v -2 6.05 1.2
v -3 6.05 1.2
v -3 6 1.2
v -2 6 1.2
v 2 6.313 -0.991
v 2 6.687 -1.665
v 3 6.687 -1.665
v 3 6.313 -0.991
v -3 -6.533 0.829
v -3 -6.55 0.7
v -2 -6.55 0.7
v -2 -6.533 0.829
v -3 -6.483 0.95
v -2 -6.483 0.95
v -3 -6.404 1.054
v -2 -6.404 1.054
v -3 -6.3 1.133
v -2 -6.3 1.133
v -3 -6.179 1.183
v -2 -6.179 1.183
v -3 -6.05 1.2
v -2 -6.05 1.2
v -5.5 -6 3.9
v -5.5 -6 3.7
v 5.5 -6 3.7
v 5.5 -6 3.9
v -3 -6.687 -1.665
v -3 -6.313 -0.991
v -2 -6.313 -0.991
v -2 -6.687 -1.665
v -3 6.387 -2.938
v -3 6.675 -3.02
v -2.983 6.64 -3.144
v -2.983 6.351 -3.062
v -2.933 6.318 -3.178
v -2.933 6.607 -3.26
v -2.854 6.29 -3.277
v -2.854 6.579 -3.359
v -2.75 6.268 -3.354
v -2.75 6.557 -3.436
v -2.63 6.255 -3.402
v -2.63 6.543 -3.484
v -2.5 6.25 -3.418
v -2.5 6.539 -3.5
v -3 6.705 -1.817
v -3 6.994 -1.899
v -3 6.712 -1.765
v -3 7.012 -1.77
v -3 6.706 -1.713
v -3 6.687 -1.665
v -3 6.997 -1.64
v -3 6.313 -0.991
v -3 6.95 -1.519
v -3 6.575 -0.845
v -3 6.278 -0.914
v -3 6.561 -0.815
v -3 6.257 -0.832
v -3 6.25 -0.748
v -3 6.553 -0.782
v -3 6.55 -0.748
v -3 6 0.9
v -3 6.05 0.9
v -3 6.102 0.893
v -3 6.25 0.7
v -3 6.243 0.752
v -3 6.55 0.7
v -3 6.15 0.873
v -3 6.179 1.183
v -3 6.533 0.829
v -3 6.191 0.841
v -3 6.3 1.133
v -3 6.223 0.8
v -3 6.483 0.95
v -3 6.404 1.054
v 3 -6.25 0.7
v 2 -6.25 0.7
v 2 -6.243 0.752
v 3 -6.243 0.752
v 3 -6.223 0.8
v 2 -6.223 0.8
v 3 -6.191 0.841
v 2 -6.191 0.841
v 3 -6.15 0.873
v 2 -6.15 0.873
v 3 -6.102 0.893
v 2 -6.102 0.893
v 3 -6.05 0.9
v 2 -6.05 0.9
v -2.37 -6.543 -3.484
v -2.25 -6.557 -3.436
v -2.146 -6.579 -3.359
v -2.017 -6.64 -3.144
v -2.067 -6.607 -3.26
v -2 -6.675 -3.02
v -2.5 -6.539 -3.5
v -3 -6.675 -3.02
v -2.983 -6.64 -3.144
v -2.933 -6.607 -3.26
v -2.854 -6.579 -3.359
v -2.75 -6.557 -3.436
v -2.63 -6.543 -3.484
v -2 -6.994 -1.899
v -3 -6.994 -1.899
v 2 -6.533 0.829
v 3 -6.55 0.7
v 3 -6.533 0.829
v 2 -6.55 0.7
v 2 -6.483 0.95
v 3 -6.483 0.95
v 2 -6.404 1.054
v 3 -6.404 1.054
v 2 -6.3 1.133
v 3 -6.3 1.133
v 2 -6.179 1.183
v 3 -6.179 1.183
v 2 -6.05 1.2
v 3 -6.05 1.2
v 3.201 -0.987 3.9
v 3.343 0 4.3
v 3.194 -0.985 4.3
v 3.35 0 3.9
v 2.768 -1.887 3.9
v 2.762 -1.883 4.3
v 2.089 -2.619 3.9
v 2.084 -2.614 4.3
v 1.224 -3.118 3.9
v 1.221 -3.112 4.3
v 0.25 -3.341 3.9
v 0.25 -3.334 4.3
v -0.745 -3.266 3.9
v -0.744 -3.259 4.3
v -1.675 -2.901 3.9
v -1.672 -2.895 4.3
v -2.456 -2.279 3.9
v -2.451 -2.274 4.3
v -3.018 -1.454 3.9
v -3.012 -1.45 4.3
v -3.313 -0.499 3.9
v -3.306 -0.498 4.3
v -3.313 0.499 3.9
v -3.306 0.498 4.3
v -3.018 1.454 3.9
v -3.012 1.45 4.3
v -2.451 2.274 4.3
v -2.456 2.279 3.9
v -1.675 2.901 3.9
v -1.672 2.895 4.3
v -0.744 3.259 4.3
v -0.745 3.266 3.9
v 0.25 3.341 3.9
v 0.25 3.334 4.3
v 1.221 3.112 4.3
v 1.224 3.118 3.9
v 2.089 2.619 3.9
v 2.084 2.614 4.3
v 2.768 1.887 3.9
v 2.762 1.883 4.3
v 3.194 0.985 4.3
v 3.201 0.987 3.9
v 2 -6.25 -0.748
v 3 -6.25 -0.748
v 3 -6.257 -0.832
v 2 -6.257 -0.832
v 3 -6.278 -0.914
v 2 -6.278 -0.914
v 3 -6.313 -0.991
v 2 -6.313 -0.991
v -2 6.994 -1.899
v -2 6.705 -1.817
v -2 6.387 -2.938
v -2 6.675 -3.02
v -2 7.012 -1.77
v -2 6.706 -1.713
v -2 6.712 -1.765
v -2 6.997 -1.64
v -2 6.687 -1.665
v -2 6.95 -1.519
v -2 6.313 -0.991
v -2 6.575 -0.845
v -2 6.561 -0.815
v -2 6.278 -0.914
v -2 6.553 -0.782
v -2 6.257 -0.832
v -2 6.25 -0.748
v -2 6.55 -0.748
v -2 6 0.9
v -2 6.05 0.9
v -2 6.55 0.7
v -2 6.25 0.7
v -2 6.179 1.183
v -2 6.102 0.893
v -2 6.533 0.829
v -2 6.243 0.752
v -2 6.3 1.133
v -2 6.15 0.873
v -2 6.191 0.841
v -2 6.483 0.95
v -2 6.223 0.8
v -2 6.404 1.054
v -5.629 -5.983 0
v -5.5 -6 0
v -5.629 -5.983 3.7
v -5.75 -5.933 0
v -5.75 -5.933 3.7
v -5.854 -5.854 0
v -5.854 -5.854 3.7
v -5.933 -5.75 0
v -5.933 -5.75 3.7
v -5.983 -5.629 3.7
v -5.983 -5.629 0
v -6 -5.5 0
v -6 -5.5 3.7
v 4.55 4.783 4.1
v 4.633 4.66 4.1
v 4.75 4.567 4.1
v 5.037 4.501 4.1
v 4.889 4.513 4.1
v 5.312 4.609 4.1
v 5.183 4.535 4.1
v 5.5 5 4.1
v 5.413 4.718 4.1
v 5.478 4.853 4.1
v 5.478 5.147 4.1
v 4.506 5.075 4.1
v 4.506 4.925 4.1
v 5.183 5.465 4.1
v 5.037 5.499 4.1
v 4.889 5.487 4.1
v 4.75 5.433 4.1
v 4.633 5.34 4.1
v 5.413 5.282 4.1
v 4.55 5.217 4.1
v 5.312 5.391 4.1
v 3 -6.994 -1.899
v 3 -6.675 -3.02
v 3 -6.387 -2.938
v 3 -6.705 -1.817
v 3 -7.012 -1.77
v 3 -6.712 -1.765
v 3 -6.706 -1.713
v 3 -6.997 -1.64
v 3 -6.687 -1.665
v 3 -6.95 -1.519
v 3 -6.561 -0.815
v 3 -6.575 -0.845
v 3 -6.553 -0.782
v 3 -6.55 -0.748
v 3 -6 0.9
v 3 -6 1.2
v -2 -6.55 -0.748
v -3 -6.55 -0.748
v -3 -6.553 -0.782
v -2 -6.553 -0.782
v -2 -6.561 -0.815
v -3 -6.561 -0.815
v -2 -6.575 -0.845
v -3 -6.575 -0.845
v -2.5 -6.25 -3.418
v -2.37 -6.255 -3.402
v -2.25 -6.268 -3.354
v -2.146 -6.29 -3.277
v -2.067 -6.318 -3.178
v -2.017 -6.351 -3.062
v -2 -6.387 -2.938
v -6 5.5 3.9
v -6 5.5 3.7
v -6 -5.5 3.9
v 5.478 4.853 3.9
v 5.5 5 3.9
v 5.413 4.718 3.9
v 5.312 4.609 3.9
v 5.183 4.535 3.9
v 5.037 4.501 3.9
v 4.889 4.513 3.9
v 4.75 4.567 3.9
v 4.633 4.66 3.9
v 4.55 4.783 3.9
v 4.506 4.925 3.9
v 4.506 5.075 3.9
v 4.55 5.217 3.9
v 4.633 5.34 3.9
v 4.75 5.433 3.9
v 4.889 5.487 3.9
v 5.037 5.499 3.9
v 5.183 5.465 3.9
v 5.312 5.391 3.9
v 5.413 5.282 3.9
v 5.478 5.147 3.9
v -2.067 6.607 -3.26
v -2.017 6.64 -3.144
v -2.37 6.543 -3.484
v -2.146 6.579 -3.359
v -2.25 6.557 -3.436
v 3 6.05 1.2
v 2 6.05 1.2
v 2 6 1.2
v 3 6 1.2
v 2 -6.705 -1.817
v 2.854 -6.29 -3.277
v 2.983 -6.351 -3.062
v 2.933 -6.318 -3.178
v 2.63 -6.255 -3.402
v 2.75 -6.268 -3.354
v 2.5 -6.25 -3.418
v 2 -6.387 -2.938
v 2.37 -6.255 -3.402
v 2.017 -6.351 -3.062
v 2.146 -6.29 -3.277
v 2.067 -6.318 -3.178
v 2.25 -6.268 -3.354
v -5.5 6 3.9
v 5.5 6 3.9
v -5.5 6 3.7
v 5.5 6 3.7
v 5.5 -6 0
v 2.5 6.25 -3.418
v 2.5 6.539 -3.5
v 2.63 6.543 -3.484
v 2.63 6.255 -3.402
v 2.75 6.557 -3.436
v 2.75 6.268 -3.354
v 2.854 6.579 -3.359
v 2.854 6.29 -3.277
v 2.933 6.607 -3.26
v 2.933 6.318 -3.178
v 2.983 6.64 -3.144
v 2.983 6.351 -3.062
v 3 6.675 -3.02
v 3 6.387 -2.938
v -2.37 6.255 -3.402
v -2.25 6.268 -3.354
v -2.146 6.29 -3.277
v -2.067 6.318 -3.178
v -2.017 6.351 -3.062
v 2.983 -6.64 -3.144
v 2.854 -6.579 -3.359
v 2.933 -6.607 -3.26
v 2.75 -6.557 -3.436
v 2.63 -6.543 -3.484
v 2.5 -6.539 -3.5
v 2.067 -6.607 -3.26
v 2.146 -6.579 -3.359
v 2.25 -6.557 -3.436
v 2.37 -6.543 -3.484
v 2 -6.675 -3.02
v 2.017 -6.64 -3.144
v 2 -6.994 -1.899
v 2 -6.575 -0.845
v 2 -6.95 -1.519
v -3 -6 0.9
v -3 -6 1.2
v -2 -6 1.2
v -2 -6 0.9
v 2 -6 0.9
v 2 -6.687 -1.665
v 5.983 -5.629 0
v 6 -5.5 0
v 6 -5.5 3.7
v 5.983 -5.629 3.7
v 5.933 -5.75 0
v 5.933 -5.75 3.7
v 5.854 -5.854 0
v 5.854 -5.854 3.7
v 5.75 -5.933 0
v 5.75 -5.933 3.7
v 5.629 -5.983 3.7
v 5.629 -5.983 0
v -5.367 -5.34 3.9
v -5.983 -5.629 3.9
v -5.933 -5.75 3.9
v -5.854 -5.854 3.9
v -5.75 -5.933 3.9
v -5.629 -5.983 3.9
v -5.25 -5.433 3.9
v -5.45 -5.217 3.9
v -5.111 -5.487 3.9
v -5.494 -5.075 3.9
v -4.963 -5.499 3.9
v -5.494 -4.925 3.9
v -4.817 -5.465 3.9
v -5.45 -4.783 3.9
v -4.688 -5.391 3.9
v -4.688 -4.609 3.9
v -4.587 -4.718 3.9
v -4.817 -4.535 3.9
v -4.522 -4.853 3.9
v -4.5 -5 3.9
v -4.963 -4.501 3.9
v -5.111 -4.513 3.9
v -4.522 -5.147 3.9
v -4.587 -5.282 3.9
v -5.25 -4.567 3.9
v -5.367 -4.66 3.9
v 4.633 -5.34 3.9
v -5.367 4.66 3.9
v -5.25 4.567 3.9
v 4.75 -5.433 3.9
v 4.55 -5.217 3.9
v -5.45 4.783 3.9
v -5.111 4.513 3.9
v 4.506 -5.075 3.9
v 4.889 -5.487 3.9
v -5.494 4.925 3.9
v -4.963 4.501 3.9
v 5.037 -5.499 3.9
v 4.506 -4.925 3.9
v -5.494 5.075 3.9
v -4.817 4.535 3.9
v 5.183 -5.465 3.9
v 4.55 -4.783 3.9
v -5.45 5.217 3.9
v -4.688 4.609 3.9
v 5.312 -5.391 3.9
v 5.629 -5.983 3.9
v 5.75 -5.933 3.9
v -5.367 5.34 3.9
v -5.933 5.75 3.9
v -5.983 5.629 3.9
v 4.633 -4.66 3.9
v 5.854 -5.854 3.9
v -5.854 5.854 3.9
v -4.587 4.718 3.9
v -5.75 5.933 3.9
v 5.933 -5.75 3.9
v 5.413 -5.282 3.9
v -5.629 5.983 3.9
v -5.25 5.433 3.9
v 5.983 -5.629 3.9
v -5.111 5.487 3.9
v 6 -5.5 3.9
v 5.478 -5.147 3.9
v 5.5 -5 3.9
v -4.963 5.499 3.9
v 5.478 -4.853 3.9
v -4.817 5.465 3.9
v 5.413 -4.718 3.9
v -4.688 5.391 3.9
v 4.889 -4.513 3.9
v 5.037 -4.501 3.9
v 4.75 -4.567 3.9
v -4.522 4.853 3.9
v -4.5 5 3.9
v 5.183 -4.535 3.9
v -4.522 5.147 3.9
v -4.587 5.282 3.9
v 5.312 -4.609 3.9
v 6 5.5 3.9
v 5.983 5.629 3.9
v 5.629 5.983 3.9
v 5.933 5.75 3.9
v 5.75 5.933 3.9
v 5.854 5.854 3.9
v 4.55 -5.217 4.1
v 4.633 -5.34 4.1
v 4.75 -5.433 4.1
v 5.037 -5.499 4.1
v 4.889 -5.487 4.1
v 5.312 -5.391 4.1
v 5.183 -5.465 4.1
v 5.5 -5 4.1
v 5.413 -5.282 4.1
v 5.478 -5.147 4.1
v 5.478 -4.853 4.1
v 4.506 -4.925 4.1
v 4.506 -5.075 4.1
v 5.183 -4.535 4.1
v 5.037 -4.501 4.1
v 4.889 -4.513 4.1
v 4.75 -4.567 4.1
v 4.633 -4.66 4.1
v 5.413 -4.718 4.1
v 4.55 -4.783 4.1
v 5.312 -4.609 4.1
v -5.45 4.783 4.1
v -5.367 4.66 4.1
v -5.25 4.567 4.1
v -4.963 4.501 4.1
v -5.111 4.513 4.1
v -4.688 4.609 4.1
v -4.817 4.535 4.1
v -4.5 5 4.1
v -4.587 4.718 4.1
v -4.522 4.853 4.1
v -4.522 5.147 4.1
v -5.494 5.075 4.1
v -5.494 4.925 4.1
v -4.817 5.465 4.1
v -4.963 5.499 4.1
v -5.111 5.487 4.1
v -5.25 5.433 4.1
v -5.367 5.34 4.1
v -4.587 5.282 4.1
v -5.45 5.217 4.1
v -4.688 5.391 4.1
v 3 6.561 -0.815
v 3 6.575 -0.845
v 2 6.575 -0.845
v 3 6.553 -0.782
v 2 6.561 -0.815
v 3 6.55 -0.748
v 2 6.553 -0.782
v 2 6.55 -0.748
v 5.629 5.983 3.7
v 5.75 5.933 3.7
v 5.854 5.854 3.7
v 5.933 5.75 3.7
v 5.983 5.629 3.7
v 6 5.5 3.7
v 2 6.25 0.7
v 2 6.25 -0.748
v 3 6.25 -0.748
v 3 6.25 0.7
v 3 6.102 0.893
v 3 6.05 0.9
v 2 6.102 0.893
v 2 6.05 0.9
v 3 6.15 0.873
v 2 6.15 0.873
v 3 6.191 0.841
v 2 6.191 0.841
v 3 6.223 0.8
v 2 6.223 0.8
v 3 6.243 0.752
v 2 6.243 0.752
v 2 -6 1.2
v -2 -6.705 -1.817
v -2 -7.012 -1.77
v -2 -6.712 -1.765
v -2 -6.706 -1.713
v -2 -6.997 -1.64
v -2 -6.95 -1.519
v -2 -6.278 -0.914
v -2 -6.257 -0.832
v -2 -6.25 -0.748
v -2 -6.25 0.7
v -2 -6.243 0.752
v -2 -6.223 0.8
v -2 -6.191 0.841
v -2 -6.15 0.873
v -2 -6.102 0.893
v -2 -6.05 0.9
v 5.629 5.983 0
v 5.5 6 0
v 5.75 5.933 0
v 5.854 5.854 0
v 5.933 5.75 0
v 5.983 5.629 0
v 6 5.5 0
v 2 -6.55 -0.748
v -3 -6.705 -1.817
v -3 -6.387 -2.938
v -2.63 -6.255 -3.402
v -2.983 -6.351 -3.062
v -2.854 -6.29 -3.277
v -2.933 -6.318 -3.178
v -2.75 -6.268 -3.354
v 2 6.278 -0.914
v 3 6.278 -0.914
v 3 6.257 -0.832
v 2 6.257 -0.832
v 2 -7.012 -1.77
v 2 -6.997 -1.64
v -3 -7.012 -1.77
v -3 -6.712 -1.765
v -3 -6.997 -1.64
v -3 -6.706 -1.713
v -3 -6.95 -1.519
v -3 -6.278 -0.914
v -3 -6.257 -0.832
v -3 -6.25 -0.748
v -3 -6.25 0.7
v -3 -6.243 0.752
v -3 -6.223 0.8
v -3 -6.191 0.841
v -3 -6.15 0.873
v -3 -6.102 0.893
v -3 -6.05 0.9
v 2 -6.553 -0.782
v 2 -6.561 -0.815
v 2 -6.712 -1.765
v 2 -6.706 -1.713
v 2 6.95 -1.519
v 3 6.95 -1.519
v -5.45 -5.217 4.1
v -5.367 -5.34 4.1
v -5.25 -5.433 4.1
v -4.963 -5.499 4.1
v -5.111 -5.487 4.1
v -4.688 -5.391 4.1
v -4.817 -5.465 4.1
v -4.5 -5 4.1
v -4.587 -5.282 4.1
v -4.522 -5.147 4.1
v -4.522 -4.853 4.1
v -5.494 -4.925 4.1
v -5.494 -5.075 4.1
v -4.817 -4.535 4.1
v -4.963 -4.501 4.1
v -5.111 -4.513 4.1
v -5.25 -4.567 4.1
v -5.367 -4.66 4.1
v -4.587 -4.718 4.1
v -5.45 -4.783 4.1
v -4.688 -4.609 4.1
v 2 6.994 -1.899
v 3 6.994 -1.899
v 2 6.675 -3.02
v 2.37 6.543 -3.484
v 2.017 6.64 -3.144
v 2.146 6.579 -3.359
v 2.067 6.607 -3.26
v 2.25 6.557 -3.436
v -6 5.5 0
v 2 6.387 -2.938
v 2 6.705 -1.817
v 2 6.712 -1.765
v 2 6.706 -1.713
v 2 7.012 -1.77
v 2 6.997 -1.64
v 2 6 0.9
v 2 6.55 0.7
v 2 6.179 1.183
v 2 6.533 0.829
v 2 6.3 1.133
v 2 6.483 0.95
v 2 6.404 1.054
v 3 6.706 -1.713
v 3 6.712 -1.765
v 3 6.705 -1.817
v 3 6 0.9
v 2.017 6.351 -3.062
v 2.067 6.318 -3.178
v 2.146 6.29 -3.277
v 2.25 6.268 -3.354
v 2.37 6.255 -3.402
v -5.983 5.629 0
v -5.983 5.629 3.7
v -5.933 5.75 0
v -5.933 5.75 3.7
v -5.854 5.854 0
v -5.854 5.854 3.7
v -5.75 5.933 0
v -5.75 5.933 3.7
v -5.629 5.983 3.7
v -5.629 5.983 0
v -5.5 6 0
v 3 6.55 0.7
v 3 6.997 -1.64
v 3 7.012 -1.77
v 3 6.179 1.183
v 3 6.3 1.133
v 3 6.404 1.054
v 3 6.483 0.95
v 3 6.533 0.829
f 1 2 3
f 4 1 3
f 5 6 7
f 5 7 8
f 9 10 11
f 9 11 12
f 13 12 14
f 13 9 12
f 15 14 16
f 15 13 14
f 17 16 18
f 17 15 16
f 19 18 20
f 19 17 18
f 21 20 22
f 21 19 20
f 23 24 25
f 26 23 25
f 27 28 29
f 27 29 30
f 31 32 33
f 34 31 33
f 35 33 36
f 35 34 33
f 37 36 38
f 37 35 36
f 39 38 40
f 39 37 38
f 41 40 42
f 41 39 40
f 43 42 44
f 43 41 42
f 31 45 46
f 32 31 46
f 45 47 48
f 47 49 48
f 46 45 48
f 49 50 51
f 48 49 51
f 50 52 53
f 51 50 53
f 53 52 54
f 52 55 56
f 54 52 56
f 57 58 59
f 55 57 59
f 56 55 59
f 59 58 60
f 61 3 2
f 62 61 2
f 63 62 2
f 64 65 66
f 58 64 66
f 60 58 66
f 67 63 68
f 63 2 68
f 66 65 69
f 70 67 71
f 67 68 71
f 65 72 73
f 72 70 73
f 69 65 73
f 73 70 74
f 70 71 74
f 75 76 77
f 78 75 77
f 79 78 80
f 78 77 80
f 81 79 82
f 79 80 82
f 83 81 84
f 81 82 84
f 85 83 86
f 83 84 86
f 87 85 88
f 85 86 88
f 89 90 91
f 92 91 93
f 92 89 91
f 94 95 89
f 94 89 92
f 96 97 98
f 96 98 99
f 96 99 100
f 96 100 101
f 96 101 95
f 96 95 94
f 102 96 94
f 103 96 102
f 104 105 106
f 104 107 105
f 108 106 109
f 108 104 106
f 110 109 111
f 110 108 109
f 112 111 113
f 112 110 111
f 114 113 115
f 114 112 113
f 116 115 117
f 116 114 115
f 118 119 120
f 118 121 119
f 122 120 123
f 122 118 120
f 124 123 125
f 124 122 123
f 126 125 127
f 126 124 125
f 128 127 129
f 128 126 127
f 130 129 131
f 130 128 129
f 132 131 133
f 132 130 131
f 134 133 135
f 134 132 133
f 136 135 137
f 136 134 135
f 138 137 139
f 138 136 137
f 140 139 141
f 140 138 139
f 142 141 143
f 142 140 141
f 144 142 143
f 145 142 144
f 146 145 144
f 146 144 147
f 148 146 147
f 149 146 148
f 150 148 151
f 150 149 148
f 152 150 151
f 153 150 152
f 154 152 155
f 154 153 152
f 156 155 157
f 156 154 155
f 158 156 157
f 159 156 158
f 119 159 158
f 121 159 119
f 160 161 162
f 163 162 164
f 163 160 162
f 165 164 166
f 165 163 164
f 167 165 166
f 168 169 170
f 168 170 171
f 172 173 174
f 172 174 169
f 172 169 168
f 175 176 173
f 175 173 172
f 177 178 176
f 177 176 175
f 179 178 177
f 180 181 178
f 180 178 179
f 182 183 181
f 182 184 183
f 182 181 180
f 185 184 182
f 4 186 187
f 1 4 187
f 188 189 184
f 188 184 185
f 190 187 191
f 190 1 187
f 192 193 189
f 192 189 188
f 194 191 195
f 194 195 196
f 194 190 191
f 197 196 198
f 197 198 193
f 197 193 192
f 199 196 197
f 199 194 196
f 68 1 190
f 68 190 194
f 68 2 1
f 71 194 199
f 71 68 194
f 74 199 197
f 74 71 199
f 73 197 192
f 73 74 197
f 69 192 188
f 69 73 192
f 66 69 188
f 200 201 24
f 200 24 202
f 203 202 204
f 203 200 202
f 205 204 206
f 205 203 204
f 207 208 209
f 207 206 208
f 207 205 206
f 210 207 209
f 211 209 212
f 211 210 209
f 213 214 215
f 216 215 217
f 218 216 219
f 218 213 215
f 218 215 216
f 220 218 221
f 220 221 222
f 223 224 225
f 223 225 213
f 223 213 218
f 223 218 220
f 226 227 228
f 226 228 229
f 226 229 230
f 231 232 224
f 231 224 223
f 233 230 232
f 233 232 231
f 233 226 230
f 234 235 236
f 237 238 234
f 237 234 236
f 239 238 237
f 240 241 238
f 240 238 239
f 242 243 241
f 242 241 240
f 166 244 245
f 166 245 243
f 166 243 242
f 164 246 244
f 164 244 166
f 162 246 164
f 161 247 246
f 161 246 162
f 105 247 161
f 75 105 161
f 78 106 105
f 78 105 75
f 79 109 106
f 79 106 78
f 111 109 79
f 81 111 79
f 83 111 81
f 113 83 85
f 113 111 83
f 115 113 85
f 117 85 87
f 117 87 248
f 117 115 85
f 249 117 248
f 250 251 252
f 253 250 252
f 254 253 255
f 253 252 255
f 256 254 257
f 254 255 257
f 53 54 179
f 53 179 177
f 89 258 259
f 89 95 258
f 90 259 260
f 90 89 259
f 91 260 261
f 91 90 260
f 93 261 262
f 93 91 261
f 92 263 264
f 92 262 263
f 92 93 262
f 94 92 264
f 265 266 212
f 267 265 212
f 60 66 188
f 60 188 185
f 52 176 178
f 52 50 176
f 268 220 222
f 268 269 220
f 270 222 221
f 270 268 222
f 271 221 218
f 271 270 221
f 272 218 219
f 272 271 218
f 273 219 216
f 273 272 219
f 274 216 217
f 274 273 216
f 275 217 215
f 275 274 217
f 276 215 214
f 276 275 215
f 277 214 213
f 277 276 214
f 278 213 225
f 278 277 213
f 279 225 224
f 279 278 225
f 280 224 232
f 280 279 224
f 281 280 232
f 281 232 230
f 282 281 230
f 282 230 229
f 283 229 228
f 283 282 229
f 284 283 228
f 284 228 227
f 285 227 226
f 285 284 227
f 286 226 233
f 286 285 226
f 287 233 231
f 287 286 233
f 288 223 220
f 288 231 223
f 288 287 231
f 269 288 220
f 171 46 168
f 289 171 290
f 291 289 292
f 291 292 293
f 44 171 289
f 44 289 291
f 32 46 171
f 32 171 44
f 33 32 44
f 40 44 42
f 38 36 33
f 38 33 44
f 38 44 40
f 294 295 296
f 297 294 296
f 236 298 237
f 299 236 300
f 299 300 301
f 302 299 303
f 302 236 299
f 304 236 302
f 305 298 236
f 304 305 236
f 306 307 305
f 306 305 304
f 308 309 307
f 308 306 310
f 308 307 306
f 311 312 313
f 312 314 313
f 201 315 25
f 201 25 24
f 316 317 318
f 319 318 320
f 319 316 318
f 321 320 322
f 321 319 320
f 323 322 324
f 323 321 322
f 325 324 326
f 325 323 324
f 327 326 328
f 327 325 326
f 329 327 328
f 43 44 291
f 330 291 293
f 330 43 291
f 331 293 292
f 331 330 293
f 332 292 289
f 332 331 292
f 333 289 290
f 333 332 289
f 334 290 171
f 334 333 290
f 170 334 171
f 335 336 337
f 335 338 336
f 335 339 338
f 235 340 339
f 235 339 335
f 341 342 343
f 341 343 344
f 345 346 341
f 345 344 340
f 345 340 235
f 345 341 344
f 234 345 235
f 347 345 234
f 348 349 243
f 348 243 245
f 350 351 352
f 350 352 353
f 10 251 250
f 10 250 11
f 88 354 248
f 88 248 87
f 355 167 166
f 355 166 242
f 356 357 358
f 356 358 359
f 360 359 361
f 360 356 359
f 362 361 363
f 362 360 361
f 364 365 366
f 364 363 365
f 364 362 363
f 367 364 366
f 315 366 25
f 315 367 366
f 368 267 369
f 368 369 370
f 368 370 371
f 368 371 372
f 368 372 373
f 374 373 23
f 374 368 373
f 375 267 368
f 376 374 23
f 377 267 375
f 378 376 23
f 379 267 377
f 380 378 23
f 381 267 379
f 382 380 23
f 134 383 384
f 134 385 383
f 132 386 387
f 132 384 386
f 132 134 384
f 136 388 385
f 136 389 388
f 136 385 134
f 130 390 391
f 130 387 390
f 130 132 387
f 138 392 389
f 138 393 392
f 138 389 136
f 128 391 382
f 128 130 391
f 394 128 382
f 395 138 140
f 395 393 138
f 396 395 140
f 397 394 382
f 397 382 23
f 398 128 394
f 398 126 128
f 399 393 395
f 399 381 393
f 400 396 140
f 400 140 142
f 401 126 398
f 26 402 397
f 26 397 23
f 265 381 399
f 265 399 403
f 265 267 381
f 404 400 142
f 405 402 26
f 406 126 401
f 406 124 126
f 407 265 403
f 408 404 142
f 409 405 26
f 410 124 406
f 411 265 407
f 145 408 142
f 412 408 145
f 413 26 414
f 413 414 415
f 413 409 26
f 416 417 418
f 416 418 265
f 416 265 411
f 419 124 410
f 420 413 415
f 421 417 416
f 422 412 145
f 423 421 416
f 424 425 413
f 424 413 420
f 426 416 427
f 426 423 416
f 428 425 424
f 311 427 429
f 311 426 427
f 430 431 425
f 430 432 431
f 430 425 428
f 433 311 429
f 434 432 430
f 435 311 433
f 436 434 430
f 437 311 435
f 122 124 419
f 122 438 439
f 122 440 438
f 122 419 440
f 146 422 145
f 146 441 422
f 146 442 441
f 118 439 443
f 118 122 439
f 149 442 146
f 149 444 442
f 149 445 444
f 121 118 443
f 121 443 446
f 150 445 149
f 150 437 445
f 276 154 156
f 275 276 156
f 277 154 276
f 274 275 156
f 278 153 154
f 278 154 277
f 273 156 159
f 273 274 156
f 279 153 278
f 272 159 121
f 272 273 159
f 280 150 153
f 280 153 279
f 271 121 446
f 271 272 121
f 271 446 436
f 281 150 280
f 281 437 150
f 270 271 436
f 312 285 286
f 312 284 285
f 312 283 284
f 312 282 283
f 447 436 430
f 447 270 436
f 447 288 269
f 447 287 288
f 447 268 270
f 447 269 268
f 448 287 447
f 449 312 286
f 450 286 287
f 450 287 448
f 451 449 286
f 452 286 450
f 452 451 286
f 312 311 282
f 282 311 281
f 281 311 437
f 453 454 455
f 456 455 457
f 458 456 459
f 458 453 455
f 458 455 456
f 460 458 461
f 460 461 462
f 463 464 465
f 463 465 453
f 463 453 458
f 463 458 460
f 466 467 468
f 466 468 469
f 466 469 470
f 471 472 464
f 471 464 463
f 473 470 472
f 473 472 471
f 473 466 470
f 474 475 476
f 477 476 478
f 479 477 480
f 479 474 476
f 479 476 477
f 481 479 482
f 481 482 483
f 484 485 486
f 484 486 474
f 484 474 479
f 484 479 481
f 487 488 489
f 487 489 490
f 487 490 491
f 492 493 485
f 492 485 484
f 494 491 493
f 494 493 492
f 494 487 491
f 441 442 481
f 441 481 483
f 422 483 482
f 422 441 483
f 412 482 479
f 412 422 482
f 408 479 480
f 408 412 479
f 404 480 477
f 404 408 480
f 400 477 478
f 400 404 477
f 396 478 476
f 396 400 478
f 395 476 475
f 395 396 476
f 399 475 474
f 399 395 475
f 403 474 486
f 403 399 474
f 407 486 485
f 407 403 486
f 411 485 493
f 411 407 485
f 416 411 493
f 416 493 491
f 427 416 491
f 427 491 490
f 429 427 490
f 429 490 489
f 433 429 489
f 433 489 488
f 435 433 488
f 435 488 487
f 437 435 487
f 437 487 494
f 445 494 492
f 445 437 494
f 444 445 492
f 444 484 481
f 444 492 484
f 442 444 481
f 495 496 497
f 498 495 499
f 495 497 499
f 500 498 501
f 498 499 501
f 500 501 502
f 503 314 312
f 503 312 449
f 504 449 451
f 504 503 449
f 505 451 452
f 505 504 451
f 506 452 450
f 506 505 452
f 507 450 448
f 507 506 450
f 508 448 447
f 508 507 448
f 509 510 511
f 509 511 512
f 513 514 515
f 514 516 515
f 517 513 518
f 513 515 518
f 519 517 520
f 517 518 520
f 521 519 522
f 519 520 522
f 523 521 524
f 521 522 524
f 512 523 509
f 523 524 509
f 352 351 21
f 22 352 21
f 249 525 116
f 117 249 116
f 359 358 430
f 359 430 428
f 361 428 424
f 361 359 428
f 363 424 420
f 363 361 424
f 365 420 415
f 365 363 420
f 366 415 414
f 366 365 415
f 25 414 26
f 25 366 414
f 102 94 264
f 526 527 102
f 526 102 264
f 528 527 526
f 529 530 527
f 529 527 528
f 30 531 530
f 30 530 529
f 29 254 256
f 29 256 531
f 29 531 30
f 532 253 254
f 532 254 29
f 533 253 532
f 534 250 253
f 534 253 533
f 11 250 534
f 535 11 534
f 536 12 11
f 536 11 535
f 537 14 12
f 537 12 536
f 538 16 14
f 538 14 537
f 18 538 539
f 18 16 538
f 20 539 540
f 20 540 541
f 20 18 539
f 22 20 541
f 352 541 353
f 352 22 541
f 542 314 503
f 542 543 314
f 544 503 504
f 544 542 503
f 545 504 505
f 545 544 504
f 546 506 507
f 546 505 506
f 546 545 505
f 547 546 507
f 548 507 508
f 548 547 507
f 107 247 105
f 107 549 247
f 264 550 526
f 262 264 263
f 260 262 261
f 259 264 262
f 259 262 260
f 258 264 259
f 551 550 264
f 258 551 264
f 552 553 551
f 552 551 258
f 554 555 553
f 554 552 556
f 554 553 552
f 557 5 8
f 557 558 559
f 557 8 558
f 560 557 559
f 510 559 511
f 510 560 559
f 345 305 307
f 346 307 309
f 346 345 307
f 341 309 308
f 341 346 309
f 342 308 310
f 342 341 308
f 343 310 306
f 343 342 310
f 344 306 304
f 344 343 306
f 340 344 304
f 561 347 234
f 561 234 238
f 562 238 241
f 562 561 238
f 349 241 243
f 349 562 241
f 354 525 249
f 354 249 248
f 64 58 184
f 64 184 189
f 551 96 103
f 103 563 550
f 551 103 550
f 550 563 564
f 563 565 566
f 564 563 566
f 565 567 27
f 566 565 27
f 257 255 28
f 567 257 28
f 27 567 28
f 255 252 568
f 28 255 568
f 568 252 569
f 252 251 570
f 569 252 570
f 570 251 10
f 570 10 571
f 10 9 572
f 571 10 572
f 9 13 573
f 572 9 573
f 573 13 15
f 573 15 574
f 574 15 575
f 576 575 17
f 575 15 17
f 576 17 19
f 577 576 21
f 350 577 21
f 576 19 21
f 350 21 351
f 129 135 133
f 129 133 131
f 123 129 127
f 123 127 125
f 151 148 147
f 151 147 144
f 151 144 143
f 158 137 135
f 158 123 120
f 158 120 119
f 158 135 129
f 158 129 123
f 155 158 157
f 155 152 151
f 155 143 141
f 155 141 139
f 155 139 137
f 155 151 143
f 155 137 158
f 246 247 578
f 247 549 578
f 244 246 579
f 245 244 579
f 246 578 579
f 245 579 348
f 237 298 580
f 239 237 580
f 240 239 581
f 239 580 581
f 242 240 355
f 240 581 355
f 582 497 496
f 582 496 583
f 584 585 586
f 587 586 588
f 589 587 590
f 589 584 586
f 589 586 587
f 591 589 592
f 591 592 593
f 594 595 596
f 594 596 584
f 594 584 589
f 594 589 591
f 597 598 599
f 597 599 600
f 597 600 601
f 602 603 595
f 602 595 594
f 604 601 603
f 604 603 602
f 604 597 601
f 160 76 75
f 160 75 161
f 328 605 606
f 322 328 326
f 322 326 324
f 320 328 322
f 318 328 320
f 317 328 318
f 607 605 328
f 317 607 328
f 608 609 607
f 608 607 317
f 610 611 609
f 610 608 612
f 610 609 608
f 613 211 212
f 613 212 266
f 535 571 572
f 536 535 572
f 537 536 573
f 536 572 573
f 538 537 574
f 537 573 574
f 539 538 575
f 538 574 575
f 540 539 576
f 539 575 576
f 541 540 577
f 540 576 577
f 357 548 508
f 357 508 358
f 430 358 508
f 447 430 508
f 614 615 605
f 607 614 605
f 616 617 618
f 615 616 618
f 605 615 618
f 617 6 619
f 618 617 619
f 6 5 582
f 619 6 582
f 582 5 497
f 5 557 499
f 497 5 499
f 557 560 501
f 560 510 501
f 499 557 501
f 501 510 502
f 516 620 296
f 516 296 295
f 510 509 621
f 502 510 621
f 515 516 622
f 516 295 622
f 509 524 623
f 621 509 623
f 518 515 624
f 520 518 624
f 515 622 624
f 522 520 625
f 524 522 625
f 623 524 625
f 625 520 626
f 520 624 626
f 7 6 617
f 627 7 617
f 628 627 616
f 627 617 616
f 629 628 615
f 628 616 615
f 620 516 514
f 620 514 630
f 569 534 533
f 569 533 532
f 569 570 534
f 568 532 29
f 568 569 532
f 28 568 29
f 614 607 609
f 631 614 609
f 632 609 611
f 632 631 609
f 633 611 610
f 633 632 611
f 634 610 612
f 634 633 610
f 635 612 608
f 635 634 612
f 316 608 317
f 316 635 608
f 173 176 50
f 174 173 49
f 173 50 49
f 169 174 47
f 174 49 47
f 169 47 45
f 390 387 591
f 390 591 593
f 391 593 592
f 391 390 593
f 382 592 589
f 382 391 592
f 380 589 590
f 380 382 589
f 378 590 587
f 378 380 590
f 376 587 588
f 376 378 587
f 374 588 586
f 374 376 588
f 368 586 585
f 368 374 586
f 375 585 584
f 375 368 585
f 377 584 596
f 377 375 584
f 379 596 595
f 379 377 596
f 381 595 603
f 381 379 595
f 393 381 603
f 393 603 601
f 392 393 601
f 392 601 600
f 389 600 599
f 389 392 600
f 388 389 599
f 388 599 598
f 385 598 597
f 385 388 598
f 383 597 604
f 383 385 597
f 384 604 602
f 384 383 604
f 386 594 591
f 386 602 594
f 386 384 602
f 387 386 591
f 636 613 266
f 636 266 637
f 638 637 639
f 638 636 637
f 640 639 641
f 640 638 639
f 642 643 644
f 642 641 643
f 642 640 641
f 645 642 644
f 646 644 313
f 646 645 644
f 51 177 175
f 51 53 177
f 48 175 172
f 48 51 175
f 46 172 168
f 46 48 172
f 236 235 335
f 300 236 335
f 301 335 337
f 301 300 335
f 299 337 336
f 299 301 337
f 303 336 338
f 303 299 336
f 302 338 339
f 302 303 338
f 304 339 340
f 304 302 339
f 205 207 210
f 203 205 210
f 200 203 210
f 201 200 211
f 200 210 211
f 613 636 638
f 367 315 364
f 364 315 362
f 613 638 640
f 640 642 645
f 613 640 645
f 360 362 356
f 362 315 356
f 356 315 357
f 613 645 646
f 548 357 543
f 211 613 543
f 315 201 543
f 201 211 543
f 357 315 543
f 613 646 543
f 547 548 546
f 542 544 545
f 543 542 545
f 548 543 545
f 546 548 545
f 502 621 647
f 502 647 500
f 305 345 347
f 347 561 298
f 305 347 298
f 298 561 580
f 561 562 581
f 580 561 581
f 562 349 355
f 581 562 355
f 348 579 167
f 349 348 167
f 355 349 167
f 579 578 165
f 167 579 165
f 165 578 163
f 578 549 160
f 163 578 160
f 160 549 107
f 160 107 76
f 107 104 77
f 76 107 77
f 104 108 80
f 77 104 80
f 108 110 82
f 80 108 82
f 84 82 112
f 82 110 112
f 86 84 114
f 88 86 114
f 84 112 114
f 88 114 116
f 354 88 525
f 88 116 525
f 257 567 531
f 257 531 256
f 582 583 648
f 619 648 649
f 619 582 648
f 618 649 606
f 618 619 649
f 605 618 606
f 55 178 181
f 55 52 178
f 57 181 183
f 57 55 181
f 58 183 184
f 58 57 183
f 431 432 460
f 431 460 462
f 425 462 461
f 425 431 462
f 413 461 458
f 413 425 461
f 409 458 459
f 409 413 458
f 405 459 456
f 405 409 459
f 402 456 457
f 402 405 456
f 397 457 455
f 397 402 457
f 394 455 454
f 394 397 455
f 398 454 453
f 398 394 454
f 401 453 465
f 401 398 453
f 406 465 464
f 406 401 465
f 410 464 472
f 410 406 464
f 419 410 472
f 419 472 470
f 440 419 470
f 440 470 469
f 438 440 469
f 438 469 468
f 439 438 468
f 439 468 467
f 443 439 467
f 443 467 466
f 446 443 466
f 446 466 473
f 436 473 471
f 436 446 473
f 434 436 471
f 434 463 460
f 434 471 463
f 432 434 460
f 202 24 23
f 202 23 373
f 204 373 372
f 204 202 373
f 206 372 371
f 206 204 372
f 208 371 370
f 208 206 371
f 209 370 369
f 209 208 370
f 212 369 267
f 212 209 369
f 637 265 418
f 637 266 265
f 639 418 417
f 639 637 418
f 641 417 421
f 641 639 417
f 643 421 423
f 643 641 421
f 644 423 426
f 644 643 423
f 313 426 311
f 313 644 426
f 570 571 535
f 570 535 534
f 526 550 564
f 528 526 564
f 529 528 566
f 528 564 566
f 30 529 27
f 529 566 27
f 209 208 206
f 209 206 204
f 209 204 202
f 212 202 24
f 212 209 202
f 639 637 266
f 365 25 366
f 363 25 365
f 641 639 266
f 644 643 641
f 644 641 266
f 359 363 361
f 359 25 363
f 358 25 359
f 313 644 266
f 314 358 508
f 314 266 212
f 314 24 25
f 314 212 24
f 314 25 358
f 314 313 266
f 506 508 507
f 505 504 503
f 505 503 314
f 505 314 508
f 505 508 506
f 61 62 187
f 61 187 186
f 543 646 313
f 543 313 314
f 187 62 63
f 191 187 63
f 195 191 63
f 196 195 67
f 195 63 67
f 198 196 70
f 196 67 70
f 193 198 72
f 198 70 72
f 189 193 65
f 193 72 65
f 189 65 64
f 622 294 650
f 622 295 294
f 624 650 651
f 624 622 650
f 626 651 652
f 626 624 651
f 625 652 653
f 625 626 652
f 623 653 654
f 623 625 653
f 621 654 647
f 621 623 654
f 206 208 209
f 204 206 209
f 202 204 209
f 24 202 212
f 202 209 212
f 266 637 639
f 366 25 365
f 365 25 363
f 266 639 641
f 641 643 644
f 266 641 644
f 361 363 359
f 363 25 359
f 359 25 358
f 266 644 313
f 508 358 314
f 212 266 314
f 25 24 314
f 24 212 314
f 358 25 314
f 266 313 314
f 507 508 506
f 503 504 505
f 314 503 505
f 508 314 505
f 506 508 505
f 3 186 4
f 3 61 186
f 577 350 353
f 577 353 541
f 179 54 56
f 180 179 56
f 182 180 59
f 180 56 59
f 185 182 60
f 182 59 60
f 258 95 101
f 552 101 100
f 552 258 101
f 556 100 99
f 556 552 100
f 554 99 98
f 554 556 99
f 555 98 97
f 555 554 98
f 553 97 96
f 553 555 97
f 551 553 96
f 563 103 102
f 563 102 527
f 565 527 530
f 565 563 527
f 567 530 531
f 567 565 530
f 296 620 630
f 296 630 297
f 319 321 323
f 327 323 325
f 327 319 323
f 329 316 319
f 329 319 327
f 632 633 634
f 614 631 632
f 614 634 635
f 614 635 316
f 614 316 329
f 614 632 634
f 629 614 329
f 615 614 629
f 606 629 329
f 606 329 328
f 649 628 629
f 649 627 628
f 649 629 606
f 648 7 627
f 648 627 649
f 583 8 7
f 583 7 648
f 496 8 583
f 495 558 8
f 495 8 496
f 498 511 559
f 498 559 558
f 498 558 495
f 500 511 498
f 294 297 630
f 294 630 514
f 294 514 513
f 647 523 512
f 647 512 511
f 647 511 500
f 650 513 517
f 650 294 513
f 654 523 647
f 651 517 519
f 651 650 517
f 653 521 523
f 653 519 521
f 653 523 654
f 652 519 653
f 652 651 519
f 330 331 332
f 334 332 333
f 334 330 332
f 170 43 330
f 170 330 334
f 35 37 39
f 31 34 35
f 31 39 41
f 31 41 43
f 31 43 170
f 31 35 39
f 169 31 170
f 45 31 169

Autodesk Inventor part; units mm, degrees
ref_plane "YZ Plane" through (0, 0, 0) normal (1, 0, 0) x (0, 1, 0)
ref_plane "XZ Plane" through (0, 0, 0) normal (0, 1, 0) x (-1, 0, 0)
ref_plane "XY Plane" through (0, 0, 0) normal (0, 0, 1) x (1, 0, 0)
sketch "Boceto39" plane through (0, 0, 0) normal (0, 0, 1) x (1, 0, 0)
  line L0 (-5.5, 6) -> (5.5, 6)
  line L1 (6, 5.5) -> (6, -5.5)
  line L2 (5.5, -6) -> (-5.5, -6)
  line L3 (-6, -5.5) -> (-6, 5.5)
  arc A0 (6, 5.5) -> (5.5, 6) centre (5.5, 5.5) ccw
  arc A1 (-5.5, 6) -> (-6, 5.5) centre (-5.5, 5.5) ccw
  arc A2 (-6, -5.5) -> (-5.5, -6) centre (-5.5, -5.5) ccw
  arc A3 (5.5, -6) -> (6, -5.5) centre (5.5, -5.5) ccw
  point P0 (0, 0)
  point P1 (-6, 6)
  point P2 (6, -6)
  point P3 (6, 6)
  point P4 (-6, -6)
  point P5 (0, 6)
  point P6 (6, 0)
  dimension "d373" = 12
  dimension "d376" = 0.5
extrude "Extrusión13" add sketch "Boceto39" along normal blind 3.7
sketch "Boceto40" plane through (0, 0, 3.7) normal (0, 0, 1) x (1, 0, 0)
  line L0 (5.5, 6) -> (-5.5, 6) projected
  arc A0 (-5.5, 6) -> (-6, 5.5) centre (-5.5, 5.5) ccw projected
  line L1 (-6, 5.5) -> (-6, -5.5) projected
  arc A1 (-6, -5.5) -> (-5.5, -6) centre (-5.5, -5.5) ccw projected
  line L2 (-5.5, -6) -> (5.5, -6) projected
  arc A2 (5.5, -6) -> (6, -5.5) centre (5.5, -5.5) ccw projected
  line L3 (6, -5.5) -> (6, 5.5) projected
  arc A3 (6, 5.5) -> (5.5, 6) centre (5.5, 5.5) ccw projected
  point P0 (0, 0)
extrude "Extrusión14" add sketch "Boceto40" along normal blind 0.2 separate body
sketch "Boceto43" plane through (0, 0, 0) normal (1, 0, 0) x (0, 1, 0)
  line L0 (0, 0) -> (0, -3.6276) construction
  line L1 (6, 0) -> (6, 3.7) construction
  line L2 (6.05, 1.2) -> (6, 1.2)
  line L3 (5.5, 3.9) -> (-5.5, 3.9) projected
  line L4 (5.5, 0) -> (-5.5, 0) projected
  line L5 (6.55, 0.7) -> (6.55, -0.7482)
  line L6 (6.5752, -0.8453) -> (6.9496, -1.5193)
  line L7 (6.9935, -1.8988) -> (6.5386, -3.5)
  line L8 (6.5386, -3.5) -> (6.25, -3.418)
  line L9 (6.25, -3.418) -> (6.7049, -1.8168)
  line L10 (6.6874, -1.665) -> (6.3129, -0.991)
  line L11 (6.25, -0.7482) -> (6.25, 0.7)
  line L12 (6.05, 0.9) -> (6, 0.9)
  line L13 (6, 0.9) -> (6, 1.2)
  arc A0 (6.25, 0.7) -> (6.05, 0.9) centre (6.05, 0.7) ccw
  arc A1 (6.55, -0.7482) -> (6.5752, -0.8453) centre (6.75, -0.7482) ccw
  arc A2 (6.7049, -1.8168) -> (6.6874, -1.665) centre (6.5126, -1.7622) ccw
  arc A3 (6.55, 0.7) -> (6.05, 1.2) centre (6.05, 0.7) ccw
  arc A4 (6.25, -0.7482) -> (6.3129, -0.991) centre (6.75, -0.7482) ccw
  arc A5 (6.9935, -1.8988) -> (6.9496, -1.5193) centre (6.5126, -1.7622) ccw
  point P0 (6.55, 1.2)
  point P1 (6.55, -0.8)
  point P2 (7.05, -1.7)
  point P3 (6.25, -0.8777)
  dimension "d399" = 2.7
  dimension "d426" = 0.3
  dimension "d427" = 0.3
  dimension "d428" = 0.3
  dimension "d429" = 0.3
  dimension "d430" = 7.05
  dimension "d431" = 6.25
  dimension "d432" = 3.5
  dimension "d433" = 1.8
  dimension "d434" = 2
  dimension "d435" = 0.2
  dimension "d436" = 0.5
extrude "Extrusión15" add sketch "Boceto43" along normal mid plane 6 separate body
sketch "Boceto45" plane through (0, 0, 0) normal (1, 0, 0) x (0, 1, 0)
  line L0 (6, 1.2) -> (6.05, 1.2) projected
  line L1 (6, 1.2) -> (7.4698, 1.2)
  line L2 (7.4698, 1.2) -> (7.4698, -3.9971)
  line L3 (7.4698, -3.9971) -> (6, -3.9971)
  line L4 (6, -3.9971) -> (6, 1.2)
  point P0 (0, 0)
  point P1 (3.3, 0.8)
  point P2 (6.05, 1.2)
extrude "Extrusión17" cut sketch "Boceto45" along normal mid plane 4 bodies 3
fillet "Empalme44" radius 0.5 4 edges at (3, 6.3943, -3.459) (2, 6.3943, -3.459) (-2, 6.3943, -3.459) (-3, 6.3943, -3.459)
mirror "Simetría1" about plane through (0, 0, 0) normal (0, 1, 0) of "Extrusión15", "Extrusión17", "Empalme44" bodies 3
sketch "Boceto46" plane through (0, 0, 3.9) normal (0, 0, 1) x (1, 0, 0)
  line L0 (-5, -5) -> (5, -5) construction
  line L1 (5, -5) -> (5, 5) construction
  line L2 (5, 5) -> (-5, 5) construction
  line L3 (-5, 5) -> (-5, -5) construction
  circle A0 centre (-5, -5) radius 0.5
  circle A1 centre (-5, 5) radius 0.5
  circle A2 centre (5, 5) radius 0.5
  circle A3 centre (5, -5) radius 0.5
  point P0 (0, 0)
  point P1 (0, -5)
  point P2 (-5, 0)
  dimension "d417" = 1
  dimension "d418" = 10
extrude "Extrusión18" add sketch "Boceto46" along normal blind 0.2 bodies 2
sketch "Boceto48" plane through (0, 0, 0) normal (0, 1, 0) x (-1, 0, 0)
  line L0 (0, 0) -> (0, 17.1627)
  line L1 (-5.5, 3.9) -> (5.5, 3.9) construction
  line L2 (0, 3.9) -> (-3.35, 3.9)
  line L3 (-3.35, 3.9) -> (-3.343, 4.3)
  line L4 (-3.343, 4.3) -> (0, 4.3)
  line L5 (0, 4.3) -> (0, 3.9)
  line L6 (-5.5, 0) -> (5.5, 0) projected
  line L7 (-3.35, 3.9) -> (-3.35, 4.5675) construction
  dimension "d422" = 4.3
  dimension "d423" = 6.7
  dimension "d424" = 1
revolve "Revolución14" add sketch "Boceto48" angle 360 about axis through (0, 0, 0) along (0, 0, 1) bodies 2
properties part number "TACT-SWITCH-THT-12X12MM"
